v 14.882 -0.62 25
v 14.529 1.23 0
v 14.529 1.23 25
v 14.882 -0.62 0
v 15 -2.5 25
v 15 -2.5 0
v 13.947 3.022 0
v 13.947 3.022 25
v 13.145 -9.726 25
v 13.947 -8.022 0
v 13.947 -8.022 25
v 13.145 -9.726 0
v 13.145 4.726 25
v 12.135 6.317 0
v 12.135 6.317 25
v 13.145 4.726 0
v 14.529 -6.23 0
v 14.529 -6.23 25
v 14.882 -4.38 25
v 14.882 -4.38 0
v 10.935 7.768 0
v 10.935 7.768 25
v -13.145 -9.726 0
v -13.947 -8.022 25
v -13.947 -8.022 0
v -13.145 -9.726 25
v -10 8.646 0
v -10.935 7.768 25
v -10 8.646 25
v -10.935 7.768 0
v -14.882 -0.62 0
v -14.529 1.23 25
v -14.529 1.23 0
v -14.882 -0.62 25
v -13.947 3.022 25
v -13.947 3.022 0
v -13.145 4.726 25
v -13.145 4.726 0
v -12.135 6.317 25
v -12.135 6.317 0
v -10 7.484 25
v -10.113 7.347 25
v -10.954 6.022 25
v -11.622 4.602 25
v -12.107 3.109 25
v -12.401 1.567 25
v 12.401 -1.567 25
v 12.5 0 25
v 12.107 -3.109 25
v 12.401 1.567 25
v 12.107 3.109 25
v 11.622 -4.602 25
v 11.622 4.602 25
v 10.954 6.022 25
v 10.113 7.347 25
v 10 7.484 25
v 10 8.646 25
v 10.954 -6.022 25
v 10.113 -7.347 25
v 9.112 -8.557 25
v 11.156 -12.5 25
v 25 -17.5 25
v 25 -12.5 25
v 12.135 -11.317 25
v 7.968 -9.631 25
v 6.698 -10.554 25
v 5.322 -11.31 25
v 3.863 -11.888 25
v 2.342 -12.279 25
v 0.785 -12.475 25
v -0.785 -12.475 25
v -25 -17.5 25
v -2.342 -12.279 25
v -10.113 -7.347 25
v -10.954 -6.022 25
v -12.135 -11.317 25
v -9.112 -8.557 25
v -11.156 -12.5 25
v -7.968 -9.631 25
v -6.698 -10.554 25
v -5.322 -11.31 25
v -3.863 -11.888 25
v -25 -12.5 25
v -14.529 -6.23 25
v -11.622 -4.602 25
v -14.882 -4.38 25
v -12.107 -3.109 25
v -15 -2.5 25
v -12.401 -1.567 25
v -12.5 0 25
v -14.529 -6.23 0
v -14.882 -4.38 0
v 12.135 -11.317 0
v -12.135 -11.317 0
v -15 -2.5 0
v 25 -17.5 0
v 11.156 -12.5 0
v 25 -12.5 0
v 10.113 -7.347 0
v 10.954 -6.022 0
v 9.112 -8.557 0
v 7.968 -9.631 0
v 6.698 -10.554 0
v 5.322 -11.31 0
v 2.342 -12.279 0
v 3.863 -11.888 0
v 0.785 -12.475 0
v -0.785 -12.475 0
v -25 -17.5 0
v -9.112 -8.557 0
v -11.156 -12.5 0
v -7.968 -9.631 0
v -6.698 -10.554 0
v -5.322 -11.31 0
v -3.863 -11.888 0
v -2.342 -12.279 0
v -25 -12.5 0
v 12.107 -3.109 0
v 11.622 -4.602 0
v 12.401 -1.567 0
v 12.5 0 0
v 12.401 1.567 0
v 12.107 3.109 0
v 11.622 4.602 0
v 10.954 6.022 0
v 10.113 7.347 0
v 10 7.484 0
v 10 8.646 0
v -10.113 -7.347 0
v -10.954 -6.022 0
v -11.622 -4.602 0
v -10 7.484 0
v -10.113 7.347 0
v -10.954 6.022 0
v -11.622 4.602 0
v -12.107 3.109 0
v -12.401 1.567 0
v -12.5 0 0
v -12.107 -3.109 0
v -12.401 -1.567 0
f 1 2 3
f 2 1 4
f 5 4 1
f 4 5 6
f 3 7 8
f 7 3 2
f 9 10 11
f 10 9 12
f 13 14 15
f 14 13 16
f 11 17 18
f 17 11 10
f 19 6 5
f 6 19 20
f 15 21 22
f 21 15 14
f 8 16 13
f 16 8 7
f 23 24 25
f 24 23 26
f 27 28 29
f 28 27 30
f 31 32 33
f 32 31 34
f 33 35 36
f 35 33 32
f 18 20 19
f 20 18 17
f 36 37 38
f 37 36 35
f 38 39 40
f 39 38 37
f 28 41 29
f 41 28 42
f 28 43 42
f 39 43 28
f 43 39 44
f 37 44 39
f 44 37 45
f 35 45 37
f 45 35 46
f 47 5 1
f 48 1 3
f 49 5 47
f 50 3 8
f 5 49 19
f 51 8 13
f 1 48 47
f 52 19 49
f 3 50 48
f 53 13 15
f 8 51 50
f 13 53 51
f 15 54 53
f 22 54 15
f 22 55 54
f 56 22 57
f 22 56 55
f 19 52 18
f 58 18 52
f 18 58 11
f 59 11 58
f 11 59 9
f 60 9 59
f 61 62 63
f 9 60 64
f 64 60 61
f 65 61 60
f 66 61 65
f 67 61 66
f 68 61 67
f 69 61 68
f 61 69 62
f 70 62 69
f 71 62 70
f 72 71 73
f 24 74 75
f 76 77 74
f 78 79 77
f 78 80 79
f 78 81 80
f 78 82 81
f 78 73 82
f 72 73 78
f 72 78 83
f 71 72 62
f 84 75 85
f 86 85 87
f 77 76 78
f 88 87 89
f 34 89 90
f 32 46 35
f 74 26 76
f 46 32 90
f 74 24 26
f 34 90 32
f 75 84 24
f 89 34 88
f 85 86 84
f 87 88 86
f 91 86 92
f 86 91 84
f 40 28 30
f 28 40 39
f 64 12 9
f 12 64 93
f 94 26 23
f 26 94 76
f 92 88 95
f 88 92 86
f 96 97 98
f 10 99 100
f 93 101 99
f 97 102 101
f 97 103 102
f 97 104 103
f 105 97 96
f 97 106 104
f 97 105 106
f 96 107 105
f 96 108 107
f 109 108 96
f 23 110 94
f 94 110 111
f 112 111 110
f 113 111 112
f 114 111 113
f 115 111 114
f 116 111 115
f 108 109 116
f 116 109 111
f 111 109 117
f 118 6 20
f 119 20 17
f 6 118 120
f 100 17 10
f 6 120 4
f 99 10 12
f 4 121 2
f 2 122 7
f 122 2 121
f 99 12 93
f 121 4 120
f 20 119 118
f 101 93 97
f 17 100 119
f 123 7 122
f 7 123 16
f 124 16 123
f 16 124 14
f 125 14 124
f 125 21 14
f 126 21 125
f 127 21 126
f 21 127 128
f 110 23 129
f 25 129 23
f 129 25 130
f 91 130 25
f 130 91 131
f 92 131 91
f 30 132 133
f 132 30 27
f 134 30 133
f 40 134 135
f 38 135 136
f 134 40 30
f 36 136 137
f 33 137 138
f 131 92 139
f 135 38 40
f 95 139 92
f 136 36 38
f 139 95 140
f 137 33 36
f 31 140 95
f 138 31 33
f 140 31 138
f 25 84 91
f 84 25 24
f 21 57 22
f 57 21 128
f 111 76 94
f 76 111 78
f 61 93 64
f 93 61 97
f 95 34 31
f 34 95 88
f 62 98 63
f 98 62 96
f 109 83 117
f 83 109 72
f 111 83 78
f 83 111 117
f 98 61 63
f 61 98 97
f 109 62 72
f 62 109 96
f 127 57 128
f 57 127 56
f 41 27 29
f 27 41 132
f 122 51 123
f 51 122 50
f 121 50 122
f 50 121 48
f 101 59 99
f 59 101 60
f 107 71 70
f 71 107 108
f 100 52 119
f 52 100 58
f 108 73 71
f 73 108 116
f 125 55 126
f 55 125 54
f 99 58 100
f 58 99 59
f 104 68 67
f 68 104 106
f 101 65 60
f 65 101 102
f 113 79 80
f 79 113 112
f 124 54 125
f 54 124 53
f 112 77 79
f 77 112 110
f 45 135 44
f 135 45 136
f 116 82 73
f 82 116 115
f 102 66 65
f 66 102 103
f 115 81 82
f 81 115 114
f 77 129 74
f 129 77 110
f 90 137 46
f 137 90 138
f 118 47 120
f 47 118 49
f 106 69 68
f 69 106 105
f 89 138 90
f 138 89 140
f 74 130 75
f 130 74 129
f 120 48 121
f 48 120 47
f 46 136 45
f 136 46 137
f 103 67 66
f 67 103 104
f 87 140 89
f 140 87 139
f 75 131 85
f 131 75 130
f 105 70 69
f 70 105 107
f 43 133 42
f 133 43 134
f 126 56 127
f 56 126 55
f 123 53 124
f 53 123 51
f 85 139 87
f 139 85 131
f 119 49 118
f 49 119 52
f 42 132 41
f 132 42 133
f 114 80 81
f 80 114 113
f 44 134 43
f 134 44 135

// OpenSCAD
diameter = 25;
width = 25;
length = 50;
opening = 0.8;

rotate([0,0,0]){
    difference(){
        union(){
            translate([0,diameter*-0.1,0]) cylinder(h=width,d=diameter*1.2,$fn=50);
            translate([0,diameter*-0.6,width*0.5]) cube([length,diameter*0.2,width],center=true);
        }    
        union(){
            translate([0,diameter*0.25,width*0.5]) cube([diameter*opening,diameter*0.5,width],center=true);
            cylinder(h=width,d=diameter,$fn=50);
        }
    }    
}
